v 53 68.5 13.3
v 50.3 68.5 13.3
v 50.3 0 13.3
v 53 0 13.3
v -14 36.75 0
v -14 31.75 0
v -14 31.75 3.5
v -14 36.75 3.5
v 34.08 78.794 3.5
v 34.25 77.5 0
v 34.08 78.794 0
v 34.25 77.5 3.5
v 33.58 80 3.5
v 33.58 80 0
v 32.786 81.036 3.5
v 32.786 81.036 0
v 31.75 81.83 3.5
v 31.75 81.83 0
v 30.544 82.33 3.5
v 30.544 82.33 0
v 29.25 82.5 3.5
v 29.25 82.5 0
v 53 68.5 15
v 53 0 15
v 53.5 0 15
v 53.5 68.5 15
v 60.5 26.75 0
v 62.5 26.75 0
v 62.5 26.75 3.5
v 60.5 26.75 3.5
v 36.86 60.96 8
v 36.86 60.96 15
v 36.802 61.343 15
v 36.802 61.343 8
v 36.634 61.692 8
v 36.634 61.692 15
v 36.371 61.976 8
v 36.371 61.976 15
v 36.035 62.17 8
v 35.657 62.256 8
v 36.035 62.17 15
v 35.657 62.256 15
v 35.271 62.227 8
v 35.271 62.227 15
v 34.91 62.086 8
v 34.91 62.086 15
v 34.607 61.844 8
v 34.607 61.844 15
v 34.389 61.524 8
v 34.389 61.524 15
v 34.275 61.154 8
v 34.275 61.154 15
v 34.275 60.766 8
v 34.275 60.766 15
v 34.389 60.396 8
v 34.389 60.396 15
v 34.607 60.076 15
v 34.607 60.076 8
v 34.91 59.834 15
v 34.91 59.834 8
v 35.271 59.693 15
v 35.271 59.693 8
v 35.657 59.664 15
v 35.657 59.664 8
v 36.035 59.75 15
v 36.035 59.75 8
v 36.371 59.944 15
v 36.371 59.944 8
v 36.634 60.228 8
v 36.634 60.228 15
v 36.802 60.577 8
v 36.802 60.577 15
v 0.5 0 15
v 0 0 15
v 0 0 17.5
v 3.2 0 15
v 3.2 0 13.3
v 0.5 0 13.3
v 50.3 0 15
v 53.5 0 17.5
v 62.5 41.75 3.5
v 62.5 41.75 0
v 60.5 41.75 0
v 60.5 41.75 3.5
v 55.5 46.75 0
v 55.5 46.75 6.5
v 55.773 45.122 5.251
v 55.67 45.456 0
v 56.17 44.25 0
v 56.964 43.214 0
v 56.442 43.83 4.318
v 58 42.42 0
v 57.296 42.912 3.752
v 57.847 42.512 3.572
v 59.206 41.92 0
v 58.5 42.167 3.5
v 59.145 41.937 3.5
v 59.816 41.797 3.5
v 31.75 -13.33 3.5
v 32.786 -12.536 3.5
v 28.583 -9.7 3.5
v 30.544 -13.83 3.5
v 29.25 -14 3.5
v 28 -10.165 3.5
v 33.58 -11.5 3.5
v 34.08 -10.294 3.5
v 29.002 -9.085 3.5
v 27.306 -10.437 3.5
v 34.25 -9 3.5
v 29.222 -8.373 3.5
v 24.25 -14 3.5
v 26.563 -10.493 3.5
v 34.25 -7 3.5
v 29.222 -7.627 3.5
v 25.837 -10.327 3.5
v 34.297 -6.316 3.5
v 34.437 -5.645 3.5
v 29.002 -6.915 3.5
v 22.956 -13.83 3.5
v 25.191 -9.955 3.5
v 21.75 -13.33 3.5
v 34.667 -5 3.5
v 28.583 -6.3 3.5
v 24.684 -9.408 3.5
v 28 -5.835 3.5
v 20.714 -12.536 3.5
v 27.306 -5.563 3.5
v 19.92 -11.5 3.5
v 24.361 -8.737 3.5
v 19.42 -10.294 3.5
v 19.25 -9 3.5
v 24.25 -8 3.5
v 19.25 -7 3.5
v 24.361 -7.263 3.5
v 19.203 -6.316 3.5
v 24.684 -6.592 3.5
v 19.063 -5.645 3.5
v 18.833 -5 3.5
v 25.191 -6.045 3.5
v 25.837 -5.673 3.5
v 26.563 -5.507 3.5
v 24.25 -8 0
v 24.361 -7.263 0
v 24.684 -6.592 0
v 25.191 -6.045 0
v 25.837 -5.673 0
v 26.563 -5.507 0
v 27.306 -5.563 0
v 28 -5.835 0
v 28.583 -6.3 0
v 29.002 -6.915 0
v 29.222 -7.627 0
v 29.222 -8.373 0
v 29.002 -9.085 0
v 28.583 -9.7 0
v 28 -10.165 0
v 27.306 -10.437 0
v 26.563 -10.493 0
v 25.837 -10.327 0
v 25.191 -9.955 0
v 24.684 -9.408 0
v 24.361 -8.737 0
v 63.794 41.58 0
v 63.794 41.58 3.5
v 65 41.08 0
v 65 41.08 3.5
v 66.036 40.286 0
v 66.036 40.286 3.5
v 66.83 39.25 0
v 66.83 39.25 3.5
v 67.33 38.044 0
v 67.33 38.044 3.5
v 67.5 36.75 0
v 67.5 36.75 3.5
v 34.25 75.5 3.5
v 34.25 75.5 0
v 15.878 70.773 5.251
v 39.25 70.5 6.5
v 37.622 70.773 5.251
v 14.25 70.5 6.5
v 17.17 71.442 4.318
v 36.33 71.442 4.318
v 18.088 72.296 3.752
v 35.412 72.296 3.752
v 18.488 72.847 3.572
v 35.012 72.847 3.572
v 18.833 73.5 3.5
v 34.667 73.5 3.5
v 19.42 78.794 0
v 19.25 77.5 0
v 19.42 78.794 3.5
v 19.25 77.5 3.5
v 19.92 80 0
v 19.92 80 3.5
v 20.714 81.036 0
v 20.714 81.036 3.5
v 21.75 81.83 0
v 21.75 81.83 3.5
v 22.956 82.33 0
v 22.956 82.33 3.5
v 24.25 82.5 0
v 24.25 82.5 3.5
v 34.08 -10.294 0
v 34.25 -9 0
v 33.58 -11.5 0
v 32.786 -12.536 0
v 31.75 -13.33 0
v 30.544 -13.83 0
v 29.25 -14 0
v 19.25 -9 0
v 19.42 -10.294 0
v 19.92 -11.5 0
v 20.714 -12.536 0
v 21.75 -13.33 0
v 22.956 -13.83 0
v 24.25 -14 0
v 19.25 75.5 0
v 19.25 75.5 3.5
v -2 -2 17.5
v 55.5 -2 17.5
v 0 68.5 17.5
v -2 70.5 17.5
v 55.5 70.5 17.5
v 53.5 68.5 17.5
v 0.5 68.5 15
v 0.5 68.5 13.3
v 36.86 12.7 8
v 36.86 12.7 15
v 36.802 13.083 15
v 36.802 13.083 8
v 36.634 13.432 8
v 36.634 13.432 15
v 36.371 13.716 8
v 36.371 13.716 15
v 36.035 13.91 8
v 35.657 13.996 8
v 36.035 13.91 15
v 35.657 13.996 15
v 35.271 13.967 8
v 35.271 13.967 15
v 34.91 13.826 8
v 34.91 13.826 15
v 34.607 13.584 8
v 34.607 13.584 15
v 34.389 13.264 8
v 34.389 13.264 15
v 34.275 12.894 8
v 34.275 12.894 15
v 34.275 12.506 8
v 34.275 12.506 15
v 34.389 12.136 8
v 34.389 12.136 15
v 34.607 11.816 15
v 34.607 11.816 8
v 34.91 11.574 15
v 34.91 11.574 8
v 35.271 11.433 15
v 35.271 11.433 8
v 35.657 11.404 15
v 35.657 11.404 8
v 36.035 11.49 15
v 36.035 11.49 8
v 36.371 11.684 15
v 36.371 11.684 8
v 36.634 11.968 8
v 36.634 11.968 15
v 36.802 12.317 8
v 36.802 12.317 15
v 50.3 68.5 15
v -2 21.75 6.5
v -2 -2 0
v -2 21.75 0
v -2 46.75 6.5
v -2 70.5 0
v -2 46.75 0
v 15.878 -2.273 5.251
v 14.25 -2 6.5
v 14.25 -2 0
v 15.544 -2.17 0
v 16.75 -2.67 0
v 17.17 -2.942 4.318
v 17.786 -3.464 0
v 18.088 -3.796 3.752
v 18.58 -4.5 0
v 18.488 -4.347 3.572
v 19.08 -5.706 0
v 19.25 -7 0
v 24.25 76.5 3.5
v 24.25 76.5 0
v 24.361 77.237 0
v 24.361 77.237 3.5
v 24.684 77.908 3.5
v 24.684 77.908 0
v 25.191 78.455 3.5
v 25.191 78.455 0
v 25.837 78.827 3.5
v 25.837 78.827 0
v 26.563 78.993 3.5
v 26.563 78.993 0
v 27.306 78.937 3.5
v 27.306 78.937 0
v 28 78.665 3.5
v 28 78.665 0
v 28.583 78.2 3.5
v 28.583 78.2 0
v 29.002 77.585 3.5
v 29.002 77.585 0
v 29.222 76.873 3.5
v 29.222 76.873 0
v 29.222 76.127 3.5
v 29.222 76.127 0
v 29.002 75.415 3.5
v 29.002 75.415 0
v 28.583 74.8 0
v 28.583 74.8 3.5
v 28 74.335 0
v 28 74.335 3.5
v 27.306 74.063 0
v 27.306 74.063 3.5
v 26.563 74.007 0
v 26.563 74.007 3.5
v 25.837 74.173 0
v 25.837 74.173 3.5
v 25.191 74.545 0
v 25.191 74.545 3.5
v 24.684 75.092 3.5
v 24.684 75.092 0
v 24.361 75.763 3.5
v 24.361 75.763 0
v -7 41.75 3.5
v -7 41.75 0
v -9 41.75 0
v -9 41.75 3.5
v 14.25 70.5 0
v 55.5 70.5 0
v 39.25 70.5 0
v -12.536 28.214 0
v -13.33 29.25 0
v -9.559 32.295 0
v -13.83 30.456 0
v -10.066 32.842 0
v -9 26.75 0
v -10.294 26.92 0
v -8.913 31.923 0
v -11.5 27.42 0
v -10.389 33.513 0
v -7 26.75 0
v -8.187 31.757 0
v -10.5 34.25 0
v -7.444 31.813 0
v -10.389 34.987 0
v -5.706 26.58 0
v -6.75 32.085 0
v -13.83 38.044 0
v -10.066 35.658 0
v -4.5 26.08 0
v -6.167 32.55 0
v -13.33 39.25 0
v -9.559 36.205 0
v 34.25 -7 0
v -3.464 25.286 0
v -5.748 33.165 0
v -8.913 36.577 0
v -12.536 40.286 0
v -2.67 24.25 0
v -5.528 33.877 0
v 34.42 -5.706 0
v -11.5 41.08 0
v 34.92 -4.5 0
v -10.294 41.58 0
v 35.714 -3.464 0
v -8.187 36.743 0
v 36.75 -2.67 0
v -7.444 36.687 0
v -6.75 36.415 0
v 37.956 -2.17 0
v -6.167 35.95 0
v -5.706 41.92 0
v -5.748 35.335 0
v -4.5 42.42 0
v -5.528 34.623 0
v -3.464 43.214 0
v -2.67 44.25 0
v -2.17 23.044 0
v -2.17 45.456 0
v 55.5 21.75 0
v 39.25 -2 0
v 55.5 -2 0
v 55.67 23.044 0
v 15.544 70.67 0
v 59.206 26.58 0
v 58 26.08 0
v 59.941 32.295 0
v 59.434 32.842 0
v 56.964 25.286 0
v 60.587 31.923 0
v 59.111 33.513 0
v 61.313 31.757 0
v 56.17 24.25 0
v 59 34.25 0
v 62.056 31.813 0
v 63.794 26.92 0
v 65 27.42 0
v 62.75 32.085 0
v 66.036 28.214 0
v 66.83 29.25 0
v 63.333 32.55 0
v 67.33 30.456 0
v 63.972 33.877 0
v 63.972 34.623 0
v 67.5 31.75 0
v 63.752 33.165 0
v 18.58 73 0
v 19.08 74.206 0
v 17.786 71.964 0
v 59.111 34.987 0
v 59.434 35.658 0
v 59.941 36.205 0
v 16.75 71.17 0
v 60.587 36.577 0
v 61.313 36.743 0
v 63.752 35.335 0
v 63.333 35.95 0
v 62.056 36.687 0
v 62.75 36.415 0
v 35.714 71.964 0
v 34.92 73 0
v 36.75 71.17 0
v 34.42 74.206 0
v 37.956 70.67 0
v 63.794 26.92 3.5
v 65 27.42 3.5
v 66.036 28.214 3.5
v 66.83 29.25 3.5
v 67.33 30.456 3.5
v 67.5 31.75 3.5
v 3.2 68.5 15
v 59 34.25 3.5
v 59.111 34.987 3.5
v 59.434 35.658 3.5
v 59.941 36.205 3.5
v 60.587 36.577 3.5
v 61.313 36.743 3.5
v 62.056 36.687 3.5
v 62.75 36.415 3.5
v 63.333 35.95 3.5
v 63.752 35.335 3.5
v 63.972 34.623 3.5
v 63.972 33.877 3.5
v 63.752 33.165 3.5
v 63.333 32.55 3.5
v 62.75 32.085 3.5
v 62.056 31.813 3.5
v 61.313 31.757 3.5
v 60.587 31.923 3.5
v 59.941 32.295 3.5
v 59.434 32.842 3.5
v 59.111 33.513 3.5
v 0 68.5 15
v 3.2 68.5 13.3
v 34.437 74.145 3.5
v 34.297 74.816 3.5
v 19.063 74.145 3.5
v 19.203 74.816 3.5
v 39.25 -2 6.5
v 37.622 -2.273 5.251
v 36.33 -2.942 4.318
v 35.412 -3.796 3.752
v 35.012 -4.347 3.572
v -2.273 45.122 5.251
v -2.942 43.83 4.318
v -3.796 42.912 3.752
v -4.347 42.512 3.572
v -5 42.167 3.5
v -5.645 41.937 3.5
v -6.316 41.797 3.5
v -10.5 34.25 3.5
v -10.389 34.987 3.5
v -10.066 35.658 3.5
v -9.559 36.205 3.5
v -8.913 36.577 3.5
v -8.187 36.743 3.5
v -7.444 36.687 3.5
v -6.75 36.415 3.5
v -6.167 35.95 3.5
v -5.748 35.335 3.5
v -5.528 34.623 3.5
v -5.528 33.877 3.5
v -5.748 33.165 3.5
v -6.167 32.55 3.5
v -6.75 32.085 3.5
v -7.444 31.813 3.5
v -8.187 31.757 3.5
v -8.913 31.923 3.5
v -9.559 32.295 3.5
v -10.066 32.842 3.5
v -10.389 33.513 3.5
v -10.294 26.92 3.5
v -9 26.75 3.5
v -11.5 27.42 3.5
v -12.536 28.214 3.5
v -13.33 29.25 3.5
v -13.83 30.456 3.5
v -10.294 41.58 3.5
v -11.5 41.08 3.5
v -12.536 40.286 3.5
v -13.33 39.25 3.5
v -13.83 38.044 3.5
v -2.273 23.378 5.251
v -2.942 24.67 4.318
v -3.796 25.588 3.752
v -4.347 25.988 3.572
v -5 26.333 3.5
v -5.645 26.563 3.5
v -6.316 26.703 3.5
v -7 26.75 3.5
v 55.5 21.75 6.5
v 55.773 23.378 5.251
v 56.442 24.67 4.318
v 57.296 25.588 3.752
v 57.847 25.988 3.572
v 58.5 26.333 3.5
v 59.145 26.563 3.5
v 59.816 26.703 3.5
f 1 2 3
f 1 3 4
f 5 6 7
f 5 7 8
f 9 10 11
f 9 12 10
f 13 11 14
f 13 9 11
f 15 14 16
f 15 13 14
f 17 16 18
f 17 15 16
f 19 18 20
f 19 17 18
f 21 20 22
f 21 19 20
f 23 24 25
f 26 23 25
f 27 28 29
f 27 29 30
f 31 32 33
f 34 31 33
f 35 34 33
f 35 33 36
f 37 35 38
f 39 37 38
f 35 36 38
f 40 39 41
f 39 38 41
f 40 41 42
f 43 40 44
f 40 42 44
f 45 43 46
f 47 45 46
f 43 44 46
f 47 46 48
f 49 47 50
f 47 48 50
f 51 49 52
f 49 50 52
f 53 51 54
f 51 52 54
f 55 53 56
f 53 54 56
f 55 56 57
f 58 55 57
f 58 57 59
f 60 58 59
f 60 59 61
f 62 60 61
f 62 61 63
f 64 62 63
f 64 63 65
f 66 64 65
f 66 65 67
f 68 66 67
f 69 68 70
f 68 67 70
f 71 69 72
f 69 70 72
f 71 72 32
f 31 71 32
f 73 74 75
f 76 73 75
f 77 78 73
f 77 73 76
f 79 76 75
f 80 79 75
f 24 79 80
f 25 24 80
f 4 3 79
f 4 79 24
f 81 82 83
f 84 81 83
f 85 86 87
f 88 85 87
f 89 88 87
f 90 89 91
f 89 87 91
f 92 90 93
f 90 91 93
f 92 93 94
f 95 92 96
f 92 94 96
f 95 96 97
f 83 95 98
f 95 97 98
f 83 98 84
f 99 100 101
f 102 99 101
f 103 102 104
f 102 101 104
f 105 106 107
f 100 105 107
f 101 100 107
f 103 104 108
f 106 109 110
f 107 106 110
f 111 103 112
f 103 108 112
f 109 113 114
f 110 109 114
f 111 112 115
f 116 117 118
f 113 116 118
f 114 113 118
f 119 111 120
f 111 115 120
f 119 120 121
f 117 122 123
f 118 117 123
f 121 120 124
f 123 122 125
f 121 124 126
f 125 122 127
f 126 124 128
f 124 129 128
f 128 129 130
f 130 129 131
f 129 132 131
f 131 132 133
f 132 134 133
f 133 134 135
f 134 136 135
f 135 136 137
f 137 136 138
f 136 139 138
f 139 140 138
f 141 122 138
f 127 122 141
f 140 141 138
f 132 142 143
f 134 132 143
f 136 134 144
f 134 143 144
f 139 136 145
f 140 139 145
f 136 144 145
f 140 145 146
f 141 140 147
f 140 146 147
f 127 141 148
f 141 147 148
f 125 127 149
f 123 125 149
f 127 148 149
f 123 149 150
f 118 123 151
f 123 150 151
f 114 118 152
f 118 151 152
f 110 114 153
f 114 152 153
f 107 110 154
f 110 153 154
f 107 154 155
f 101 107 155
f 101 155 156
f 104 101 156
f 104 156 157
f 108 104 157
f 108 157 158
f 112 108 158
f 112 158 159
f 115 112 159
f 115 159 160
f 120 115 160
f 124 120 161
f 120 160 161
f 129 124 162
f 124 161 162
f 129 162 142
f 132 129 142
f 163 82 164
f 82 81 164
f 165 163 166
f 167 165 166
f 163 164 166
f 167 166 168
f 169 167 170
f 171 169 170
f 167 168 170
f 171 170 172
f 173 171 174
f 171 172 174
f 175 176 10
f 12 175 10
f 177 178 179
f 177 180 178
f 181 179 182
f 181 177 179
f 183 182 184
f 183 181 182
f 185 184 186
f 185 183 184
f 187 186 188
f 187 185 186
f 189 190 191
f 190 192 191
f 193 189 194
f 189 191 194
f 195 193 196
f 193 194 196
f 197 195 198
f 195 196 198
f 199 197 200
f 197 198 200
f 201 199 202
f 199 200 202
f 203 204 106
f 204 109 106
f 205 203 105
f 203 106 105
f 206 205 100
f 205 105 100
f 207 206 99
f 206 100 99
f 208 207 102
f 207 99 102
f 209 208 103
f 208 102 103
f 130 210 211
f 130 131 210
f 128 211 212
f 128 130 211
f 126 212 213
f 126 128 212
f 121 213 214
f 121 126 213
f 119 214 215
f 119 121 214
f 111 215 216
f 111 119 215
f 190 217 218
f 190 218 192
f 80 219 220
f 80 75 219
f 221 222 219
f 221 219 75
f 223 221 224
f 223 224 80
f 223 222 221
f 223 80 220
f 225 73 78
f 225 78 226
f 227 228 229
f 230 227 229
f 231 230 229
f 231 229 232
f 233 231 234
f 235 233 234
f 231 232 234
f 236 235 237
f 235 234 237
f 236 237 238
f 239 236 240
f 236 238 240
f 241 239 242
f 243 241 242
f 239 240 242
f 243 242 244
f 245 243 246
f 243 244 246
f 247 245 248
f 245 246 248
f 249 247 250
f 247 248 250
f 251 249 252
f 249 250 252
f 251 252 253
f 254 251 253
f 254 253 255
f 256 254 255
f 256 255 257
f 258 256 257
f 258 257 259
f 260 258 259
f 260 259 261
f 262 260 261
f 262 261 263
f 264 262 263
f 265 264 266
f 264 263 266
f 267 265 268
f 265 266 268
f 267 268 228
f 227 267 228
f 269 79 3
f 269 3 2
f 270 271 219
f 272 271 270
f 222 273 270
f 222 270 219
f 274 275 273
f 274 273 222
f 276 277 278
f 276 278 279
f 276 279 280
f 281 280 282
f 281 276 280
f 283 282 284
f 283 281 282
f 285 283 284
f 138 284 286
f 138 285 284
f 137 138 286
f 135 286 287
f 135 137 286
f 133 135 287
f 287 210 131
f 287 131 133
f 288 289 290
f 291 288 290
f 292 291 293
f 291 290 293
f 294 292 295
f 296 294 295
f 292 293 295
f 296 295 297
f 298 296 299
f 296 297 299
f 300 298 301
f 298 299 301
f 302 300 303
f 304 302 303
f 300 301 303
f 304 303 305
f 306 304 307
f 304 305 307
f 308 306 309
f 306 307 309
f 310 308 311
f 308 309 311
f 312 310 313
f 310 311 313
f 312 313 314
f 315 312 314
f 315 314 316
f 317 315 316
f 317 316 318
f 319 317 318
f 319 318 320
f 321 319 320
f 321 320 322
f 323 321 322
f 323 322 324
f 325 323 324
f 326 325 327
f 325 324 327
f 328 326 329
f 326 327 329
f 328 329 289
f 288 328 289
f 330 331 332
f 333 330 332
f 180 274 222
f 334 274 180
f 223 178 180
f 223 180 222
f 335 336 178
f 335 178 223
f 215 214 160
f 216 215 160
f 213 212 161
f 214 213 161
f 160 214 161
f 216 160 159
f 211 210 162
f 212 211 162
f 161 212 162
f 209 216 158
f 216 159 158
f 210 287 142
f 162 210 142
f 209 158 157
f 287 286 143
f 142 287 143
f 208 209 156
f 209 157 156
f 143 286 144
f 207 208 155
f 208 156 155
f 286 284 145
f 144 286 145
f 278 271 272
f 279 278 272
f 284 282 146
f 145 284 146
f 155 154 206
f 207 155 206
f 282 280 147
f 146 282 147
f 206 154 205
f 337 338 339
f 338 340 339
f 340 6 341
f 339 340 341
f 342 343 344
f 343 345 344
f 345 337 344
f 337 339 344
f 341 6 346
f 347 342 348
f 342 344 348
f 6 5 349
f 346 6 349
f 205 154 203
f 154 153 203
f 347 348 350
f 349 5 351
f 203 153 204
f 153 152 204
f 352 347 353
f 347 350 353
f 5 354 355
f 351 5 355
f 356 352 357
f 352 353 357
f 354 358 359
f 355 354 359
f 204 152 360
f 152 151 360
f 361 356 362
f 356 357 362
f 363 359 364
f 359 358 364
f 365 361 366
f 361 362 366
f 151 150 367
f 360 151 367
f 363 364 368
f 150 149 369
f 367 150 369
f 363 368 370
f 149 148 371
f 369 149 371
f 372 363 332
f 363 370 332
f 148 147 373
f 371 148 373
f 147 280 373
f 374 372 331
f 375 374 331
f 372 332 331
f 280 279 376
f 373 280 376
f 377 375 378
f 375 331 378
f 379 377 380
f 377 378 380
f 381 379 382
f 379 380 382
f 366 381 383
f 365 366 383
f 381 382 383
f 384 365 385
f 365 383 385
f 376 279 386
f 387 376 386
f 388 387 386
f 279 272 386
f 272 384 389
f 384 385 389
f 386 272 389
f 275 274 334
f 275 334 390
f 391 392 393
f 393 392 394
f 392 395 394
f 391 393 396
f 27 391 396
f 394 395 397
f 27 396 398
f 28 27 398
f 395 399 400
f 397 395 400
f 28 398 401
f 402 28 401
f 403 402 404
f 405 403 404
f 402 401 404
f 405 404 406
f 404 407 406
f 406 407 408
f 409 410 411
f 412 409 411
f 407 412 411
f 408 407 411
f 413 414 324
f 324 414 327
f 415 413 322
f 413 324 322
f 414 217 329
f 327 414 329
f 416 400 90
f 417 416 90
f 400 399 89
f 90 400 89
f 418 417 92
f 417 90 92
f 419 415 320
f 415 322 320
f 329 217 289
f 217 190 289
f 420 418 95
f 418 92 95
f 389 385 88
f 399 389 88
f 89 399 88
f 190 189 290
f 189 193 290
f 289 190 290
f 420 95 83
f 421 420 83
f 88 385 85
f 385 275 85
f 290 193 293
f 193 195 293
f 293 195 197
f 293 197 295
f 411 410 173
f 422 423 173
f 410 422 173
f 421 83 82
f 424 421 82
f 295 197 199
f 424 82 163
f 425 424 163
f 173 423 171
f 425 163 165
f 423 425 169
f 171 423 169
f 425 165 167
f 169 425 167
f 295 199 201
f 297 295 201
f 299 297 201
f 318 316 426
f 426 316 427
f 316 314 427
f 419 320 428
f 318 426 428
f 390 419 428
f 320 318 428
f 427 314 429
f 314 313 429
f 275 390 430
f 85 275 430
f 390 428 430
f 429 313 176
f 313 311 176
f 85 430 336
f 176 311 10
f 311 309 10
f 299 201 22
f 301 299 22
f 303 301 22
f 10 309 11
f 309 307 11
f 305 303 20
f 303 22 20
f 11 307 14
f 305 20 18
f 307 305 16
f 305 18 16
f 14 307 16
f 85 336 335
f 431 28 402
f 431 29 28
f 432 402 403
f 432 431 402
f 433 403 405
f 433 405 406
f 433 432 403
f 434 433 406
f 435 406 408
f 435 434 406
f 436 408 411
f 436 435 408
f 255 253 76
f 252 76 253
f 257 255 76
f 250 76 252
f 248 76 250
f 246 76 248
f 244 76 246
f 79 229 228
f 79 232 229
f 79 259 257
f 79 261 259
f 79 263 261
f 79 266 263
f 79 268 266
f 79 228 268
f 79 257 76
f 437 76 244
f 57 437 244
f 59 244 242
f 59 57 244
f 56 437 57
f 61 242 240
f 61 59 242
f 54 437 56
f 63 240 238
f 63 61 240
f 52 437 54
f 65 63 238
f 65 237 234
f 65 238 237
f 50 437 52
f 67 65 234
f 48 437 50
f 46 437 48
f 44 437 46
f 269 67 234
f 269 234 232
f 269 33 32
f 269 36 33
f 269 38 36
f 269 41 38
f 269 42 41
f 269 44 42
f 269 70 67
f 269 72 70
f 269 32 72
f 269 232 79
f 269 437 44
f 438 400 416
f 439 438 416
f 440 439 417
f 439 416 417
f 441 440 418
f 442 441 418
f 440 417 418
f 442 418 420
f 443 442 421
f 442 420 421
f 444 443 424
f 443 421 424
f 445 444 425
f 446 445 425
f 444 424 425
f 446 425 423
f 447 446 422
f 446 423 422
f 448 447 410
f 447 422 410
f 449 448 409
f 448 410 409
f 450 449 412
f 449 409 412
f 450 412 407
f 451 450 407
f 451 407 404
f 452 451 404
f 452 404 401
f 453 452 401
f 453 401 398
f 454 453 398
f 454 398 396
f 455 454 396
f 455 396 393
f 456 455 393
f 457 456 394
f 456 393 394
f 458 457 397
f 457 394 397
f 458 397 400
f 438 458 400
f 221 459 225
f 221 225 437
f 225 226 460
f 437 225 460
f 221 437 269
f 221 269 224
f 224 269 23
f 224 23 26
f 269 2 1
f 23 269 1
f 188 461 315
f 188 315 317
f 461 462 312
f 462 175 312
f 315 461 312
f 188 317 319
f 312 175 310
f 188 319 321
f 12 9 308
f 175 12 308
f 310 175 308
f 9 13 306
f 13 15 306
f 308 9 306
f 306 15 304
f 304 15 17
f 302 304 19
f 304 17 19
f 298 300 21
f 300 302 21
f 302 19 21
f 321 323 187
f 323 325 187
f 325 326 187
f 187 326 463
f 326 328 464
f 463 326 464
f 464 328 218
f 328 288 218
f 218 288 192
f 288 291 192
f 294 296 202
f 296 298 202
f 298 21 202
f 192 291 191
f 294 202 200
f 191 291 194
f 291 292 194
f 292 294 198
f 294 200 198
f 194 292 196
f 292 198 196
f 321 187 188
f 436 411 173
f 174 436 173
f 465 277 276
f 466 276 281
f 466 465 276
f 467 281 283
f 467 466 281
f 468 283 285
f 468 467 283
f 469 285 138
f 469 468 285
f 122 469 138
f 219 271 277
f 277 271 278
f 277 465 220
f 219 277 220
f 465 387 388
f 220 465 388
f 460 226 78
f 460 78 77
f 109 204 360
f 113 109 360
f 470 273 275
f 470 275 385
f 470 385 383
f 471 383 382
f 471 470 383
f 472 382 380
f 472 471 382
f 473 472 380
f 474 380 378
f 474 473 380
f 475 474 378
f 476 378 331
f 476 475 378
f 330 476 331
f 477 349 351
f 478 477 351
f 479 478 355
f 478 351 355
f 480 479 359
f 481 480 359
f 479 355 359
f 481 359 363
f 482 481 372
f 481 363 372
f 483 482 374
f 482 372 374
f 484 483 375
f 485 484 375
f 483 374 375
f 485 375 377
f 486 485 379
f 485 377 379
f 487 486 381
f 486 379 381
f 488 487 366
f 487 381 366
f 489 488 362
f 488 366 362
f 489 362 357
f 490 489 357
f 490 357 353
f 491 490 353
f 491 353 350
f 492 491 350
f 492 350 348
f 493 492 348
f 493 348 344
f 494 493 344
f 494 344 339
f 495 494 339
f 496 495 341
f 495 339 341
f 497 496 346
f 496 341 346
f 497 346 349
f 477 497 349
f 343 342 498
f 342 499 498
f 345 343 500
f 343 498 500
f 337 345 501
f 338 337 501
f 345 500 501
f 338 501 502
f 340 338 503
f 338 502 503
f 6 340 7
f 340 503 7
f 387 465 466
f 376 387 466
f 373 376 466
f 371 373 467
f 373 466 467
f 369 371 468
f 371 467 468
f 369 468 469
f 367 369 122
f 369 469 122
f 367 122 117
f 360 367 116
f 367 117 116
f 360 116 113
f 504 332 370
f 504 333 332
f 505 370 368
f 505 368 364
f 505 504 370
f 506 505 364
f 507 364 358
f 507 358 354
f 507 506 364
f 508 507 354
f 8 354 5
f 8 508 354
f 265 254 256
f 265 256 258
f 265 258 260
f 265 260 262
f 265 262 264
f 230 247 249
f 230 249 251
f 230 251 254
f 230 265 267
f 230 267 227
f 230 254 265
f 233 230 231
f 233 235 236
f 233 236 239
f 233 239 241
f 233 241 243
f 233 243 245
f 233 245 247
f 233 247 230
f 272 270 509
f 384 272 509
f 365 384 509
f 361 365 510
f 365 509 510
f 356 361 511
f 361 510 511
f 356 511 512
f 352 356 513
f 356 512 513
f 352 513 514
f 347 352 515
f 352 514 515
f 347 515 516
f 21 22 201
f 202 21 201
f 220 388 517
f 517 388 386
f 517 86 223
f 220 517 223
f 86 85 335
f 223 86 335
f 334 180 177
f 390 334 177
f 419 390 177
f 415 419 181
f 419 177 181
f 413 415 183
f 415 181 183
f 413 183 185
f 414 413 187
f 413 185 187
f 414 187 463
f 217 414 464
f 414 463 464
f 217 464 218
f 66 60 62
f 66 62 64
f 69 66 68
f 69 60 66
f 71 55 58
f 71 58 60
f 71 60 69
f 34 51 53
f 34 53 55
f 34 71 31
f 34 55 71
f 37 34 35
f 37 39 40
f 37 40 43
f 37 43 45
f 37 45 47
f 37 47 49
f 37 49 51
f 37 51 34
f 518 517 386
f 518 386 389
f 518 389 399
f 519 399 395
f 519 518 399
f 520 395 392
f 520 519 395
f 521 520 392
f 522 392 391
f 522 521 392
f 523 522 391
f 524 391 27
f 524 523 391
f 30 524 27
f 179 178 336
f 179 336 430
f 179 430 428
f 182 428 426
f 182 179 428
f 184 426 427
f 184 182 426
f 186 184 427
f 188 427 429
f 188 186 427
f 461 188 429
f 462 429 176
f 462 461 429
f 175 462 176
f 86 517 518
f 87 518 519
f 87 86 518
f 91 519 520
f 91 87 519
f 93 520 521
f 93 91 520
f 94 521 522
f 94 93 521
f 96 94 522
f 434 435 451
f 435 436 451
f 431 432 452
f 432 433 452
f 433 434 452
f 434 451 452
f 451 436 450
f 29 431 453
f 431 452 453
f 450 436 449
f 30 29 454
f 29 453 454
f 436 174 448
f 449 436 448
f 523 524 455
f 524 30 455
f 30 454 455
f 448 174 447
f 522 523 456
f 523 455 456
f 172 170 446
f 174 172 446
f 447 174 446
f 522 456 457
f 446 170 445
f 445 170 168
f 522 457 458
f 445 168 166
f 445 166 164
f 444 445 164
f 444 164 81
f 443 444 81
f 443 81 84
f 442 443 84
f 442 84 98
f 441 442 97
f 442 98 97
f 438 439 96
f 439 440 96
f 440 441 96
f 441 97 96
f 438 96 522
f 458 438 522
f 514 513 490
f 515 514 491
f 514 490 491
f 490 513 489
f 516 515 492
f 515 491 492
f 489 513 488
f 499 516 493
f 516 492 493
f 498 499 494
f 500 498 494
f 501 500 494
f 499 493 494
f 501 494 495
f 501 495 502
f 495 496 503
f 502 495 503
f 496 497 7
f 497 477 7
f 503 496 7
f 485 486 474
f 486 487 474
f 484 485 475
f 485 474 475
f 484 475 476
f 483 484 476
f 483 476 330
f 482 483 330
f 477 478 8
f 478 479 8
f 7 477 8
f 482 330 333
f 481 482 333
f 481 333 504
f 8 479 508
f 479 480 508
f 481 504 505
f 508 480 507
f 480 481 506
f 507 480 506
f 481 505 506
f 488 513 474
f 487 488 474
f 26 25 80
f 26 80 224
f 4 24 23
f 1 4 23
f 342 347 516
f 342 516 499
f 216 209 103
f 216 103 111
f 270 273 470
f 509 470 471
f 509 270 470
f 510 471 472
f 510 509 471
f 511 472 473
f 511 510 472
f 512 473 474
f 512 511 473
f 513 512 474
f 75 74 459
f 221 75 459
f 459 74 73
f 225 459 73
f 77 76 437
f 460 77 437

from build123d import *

# Parameters (mm, degrees)
SKETCH1_W                = 53.5
SKETCH1_H                = 68.5
BOSS_EXTRUDE1_DEPTH      = 15
BOSS_EXTRUDE2_DEPTH      = 2.5
BOSS_EXTRUDE2_DEPTH_BACK = 15
SKETCH2_W                = 57.5
SKETCH2_H                = 72.5
SKETCH2_W_2              = 53.5
SKETCH2_H_2              = 68.5
SKETCH3_W                = 2.7
SKETCH3_H                = 68.5
CUT_EXTRUDE1_DEPTH       = 1.7
SKETCH4_R                = 1.3
CUT_EXTRUDE2_DEPTH       = 7
SKETCH5_W                = 15
SKETCH5_H                = 12
SKETCH5_R                = 2.5
SKETCH5_W_2              = 12
SKETCH5_H_2              = 15
BOSS_EXTRUDE3_DEPTH      = 3.5
FILLET1_R                = 5
FILLET2_R                = 3


with BuildPart() as part:
    # Sketch1 → Boss-Extrude1 (new body)
    with BuildSketch(Plane.XY):
        with Locations((26.75, 34.25)):
            Rectangle(SKETCH1_W, SKETCH1_H)
    extrude(amount=BOSS_EXTRUDE1_DEPTH)

    # Sketch2 → Boss-Extrude2 (add, two sides: drawn at the far end of the back side and taken through both)
    with BuildSketch(Plane.XY.offset(15).offset(-BOSS_EXTRUDE2_DEPTH_BACK)):
        with Locations((26.75, 34.25)):
            Rectangle(SKETCH2_W, SKETCH2_H)
        with Locations((26.75, 34.25)):
            Rectangle(SKETCH2_W_2, SKETCH2_H_2, mode=Mode.SUBTRACT)
    extrude(amount=BOSS_EXTRUDE2_DEPTH + BOSS_EXTRUDE2_DEPTH_BACK)

    # Sketch3 → Cut-Extrude1 (cut)
    with BuildSketch(Plane.XY.offset(15)):
        with Locations((1.85, 34.25)):
            Rectangle(SKETCH3_W, SKETCH3_H)
        with Locations((51.65, 34.25)):
            Rectangle(SKETCH3_W, SKETCH3_H)
    extrude(amount=-CUT_EXTRUDE1_DEPTH, mode=Mode.SUBTRACT)

    # Sketch4 → Cut-Extrude2 (cut)
    with BuildSketch(Plane.XY.offset(15)):
        with Locations((35.56, 12.7)):
            Circle(SKETCH4_R)
        with Locations((35.56, 60.96)):
            Circle(SKETCH4_R)
    extrude(amount=-CUT_EXTRUDE2_DEPTH, mode=Mode.SUBTRACT)

    # Sketch5 → Boss-Extrude3 (add)
    # profile 1 of 4: a face of its own
    with BuildSketch(Plane(origin=(0, 0, 0), x_dir=(-1, 0, 0), z_dir=(0, 0, -1))):
        with Locations((-26.75, -8)):
            Rectangle(SKETCH5_W, SKETCH5_H)
        with Locations((-26.75, -8)):
            Circle(SKETCH5_R, mode=Mode.SUBTRACT)
    # profile 2 of 4: a face of its own
    with BuildSketch(Plane(origin=(0, 0, 0), x_dir=(-1, 0, 0), z_dir=(0, 0, -1))):
        with Locations((8, 34.25)):
            Rectangle(SKETCH5_W_2, SKETCH5_H_2)
        with Locations((8, 34.25)):
            Circle(SKETCH5_R, mode=Mode.SUBTRACT)
    # profile 3 of 4: a face of its own
    with BuildSketch(Plane(origin=(0, 0, 0), x_dir=(-1, 0, 0), z_dir=(0, 0, -1))):
        with Locations((-61.5, 34.25)):
            Rectangle(SKETCH5_W_2, SKETCH5_H_2)
        with Locations((-61.5, 34.25)):
            Circle(SKETCH5_R, mode=Mode.SUBTRACT)
    # profile 4 of 4: a face of its own
    with BuildSketch(Plane(origin=(0, 0, 0), x_dir=(-1, 0, 0), z_dir=(0, 0, -1))):
        with Locations((-26.75, 76.5)):
            Rectangle(SKETCH5_W, SKETCH5_H)
        with Locations((-26.75, 76.5)):
            Circle(SKETCH5_R, mode=Mode.SUBTRACT)
    extrude(amount=-BOSS_EXTRUDE3_DEPTH)

    # Fillet1
    fillet1_edges = [part.edges().sort_by_distance(p)[0] for p in [
        (55.5, 41.75, 1.75),
        (55.5, 26.75, 1.75),
        (67.5, 26.75, 1.75),
        (67.5, 41.75, 1.75),
        (34.25, 70.5, 1.75),
        (34.25, 82.5, 1.75),
        (19.25, 82.5, 1.75),
        (19.25, 70.5, 1.75),
        (34.25, -14, 1.75),
        (34.25, -2, 1.75),
        (19.25, -2, 1.75),
        (19.25, -14, 1.75),
        (-2, 26.75, 1.75),
        (-2, 41.75, 1.75),
        (-14, 41.75, 1.75),
        (-14, 26.75, 1.75),
    ]]
    fillet(fillet1_edges, radius=FILLET1_R)

    # Fillet2
    fillet2_edges = [part.edges().sort_by_distance(p)[0] for p in [
        (55.5, 34.25, 3.5),
        (26.75, 70.5, 3.5),
        (26.75, -2, 3.5),
        (-2, 34.25, 3.5),
    ]]
    fillet(fillet2_edges, radius=FILLET2_R)


solid = part.part
